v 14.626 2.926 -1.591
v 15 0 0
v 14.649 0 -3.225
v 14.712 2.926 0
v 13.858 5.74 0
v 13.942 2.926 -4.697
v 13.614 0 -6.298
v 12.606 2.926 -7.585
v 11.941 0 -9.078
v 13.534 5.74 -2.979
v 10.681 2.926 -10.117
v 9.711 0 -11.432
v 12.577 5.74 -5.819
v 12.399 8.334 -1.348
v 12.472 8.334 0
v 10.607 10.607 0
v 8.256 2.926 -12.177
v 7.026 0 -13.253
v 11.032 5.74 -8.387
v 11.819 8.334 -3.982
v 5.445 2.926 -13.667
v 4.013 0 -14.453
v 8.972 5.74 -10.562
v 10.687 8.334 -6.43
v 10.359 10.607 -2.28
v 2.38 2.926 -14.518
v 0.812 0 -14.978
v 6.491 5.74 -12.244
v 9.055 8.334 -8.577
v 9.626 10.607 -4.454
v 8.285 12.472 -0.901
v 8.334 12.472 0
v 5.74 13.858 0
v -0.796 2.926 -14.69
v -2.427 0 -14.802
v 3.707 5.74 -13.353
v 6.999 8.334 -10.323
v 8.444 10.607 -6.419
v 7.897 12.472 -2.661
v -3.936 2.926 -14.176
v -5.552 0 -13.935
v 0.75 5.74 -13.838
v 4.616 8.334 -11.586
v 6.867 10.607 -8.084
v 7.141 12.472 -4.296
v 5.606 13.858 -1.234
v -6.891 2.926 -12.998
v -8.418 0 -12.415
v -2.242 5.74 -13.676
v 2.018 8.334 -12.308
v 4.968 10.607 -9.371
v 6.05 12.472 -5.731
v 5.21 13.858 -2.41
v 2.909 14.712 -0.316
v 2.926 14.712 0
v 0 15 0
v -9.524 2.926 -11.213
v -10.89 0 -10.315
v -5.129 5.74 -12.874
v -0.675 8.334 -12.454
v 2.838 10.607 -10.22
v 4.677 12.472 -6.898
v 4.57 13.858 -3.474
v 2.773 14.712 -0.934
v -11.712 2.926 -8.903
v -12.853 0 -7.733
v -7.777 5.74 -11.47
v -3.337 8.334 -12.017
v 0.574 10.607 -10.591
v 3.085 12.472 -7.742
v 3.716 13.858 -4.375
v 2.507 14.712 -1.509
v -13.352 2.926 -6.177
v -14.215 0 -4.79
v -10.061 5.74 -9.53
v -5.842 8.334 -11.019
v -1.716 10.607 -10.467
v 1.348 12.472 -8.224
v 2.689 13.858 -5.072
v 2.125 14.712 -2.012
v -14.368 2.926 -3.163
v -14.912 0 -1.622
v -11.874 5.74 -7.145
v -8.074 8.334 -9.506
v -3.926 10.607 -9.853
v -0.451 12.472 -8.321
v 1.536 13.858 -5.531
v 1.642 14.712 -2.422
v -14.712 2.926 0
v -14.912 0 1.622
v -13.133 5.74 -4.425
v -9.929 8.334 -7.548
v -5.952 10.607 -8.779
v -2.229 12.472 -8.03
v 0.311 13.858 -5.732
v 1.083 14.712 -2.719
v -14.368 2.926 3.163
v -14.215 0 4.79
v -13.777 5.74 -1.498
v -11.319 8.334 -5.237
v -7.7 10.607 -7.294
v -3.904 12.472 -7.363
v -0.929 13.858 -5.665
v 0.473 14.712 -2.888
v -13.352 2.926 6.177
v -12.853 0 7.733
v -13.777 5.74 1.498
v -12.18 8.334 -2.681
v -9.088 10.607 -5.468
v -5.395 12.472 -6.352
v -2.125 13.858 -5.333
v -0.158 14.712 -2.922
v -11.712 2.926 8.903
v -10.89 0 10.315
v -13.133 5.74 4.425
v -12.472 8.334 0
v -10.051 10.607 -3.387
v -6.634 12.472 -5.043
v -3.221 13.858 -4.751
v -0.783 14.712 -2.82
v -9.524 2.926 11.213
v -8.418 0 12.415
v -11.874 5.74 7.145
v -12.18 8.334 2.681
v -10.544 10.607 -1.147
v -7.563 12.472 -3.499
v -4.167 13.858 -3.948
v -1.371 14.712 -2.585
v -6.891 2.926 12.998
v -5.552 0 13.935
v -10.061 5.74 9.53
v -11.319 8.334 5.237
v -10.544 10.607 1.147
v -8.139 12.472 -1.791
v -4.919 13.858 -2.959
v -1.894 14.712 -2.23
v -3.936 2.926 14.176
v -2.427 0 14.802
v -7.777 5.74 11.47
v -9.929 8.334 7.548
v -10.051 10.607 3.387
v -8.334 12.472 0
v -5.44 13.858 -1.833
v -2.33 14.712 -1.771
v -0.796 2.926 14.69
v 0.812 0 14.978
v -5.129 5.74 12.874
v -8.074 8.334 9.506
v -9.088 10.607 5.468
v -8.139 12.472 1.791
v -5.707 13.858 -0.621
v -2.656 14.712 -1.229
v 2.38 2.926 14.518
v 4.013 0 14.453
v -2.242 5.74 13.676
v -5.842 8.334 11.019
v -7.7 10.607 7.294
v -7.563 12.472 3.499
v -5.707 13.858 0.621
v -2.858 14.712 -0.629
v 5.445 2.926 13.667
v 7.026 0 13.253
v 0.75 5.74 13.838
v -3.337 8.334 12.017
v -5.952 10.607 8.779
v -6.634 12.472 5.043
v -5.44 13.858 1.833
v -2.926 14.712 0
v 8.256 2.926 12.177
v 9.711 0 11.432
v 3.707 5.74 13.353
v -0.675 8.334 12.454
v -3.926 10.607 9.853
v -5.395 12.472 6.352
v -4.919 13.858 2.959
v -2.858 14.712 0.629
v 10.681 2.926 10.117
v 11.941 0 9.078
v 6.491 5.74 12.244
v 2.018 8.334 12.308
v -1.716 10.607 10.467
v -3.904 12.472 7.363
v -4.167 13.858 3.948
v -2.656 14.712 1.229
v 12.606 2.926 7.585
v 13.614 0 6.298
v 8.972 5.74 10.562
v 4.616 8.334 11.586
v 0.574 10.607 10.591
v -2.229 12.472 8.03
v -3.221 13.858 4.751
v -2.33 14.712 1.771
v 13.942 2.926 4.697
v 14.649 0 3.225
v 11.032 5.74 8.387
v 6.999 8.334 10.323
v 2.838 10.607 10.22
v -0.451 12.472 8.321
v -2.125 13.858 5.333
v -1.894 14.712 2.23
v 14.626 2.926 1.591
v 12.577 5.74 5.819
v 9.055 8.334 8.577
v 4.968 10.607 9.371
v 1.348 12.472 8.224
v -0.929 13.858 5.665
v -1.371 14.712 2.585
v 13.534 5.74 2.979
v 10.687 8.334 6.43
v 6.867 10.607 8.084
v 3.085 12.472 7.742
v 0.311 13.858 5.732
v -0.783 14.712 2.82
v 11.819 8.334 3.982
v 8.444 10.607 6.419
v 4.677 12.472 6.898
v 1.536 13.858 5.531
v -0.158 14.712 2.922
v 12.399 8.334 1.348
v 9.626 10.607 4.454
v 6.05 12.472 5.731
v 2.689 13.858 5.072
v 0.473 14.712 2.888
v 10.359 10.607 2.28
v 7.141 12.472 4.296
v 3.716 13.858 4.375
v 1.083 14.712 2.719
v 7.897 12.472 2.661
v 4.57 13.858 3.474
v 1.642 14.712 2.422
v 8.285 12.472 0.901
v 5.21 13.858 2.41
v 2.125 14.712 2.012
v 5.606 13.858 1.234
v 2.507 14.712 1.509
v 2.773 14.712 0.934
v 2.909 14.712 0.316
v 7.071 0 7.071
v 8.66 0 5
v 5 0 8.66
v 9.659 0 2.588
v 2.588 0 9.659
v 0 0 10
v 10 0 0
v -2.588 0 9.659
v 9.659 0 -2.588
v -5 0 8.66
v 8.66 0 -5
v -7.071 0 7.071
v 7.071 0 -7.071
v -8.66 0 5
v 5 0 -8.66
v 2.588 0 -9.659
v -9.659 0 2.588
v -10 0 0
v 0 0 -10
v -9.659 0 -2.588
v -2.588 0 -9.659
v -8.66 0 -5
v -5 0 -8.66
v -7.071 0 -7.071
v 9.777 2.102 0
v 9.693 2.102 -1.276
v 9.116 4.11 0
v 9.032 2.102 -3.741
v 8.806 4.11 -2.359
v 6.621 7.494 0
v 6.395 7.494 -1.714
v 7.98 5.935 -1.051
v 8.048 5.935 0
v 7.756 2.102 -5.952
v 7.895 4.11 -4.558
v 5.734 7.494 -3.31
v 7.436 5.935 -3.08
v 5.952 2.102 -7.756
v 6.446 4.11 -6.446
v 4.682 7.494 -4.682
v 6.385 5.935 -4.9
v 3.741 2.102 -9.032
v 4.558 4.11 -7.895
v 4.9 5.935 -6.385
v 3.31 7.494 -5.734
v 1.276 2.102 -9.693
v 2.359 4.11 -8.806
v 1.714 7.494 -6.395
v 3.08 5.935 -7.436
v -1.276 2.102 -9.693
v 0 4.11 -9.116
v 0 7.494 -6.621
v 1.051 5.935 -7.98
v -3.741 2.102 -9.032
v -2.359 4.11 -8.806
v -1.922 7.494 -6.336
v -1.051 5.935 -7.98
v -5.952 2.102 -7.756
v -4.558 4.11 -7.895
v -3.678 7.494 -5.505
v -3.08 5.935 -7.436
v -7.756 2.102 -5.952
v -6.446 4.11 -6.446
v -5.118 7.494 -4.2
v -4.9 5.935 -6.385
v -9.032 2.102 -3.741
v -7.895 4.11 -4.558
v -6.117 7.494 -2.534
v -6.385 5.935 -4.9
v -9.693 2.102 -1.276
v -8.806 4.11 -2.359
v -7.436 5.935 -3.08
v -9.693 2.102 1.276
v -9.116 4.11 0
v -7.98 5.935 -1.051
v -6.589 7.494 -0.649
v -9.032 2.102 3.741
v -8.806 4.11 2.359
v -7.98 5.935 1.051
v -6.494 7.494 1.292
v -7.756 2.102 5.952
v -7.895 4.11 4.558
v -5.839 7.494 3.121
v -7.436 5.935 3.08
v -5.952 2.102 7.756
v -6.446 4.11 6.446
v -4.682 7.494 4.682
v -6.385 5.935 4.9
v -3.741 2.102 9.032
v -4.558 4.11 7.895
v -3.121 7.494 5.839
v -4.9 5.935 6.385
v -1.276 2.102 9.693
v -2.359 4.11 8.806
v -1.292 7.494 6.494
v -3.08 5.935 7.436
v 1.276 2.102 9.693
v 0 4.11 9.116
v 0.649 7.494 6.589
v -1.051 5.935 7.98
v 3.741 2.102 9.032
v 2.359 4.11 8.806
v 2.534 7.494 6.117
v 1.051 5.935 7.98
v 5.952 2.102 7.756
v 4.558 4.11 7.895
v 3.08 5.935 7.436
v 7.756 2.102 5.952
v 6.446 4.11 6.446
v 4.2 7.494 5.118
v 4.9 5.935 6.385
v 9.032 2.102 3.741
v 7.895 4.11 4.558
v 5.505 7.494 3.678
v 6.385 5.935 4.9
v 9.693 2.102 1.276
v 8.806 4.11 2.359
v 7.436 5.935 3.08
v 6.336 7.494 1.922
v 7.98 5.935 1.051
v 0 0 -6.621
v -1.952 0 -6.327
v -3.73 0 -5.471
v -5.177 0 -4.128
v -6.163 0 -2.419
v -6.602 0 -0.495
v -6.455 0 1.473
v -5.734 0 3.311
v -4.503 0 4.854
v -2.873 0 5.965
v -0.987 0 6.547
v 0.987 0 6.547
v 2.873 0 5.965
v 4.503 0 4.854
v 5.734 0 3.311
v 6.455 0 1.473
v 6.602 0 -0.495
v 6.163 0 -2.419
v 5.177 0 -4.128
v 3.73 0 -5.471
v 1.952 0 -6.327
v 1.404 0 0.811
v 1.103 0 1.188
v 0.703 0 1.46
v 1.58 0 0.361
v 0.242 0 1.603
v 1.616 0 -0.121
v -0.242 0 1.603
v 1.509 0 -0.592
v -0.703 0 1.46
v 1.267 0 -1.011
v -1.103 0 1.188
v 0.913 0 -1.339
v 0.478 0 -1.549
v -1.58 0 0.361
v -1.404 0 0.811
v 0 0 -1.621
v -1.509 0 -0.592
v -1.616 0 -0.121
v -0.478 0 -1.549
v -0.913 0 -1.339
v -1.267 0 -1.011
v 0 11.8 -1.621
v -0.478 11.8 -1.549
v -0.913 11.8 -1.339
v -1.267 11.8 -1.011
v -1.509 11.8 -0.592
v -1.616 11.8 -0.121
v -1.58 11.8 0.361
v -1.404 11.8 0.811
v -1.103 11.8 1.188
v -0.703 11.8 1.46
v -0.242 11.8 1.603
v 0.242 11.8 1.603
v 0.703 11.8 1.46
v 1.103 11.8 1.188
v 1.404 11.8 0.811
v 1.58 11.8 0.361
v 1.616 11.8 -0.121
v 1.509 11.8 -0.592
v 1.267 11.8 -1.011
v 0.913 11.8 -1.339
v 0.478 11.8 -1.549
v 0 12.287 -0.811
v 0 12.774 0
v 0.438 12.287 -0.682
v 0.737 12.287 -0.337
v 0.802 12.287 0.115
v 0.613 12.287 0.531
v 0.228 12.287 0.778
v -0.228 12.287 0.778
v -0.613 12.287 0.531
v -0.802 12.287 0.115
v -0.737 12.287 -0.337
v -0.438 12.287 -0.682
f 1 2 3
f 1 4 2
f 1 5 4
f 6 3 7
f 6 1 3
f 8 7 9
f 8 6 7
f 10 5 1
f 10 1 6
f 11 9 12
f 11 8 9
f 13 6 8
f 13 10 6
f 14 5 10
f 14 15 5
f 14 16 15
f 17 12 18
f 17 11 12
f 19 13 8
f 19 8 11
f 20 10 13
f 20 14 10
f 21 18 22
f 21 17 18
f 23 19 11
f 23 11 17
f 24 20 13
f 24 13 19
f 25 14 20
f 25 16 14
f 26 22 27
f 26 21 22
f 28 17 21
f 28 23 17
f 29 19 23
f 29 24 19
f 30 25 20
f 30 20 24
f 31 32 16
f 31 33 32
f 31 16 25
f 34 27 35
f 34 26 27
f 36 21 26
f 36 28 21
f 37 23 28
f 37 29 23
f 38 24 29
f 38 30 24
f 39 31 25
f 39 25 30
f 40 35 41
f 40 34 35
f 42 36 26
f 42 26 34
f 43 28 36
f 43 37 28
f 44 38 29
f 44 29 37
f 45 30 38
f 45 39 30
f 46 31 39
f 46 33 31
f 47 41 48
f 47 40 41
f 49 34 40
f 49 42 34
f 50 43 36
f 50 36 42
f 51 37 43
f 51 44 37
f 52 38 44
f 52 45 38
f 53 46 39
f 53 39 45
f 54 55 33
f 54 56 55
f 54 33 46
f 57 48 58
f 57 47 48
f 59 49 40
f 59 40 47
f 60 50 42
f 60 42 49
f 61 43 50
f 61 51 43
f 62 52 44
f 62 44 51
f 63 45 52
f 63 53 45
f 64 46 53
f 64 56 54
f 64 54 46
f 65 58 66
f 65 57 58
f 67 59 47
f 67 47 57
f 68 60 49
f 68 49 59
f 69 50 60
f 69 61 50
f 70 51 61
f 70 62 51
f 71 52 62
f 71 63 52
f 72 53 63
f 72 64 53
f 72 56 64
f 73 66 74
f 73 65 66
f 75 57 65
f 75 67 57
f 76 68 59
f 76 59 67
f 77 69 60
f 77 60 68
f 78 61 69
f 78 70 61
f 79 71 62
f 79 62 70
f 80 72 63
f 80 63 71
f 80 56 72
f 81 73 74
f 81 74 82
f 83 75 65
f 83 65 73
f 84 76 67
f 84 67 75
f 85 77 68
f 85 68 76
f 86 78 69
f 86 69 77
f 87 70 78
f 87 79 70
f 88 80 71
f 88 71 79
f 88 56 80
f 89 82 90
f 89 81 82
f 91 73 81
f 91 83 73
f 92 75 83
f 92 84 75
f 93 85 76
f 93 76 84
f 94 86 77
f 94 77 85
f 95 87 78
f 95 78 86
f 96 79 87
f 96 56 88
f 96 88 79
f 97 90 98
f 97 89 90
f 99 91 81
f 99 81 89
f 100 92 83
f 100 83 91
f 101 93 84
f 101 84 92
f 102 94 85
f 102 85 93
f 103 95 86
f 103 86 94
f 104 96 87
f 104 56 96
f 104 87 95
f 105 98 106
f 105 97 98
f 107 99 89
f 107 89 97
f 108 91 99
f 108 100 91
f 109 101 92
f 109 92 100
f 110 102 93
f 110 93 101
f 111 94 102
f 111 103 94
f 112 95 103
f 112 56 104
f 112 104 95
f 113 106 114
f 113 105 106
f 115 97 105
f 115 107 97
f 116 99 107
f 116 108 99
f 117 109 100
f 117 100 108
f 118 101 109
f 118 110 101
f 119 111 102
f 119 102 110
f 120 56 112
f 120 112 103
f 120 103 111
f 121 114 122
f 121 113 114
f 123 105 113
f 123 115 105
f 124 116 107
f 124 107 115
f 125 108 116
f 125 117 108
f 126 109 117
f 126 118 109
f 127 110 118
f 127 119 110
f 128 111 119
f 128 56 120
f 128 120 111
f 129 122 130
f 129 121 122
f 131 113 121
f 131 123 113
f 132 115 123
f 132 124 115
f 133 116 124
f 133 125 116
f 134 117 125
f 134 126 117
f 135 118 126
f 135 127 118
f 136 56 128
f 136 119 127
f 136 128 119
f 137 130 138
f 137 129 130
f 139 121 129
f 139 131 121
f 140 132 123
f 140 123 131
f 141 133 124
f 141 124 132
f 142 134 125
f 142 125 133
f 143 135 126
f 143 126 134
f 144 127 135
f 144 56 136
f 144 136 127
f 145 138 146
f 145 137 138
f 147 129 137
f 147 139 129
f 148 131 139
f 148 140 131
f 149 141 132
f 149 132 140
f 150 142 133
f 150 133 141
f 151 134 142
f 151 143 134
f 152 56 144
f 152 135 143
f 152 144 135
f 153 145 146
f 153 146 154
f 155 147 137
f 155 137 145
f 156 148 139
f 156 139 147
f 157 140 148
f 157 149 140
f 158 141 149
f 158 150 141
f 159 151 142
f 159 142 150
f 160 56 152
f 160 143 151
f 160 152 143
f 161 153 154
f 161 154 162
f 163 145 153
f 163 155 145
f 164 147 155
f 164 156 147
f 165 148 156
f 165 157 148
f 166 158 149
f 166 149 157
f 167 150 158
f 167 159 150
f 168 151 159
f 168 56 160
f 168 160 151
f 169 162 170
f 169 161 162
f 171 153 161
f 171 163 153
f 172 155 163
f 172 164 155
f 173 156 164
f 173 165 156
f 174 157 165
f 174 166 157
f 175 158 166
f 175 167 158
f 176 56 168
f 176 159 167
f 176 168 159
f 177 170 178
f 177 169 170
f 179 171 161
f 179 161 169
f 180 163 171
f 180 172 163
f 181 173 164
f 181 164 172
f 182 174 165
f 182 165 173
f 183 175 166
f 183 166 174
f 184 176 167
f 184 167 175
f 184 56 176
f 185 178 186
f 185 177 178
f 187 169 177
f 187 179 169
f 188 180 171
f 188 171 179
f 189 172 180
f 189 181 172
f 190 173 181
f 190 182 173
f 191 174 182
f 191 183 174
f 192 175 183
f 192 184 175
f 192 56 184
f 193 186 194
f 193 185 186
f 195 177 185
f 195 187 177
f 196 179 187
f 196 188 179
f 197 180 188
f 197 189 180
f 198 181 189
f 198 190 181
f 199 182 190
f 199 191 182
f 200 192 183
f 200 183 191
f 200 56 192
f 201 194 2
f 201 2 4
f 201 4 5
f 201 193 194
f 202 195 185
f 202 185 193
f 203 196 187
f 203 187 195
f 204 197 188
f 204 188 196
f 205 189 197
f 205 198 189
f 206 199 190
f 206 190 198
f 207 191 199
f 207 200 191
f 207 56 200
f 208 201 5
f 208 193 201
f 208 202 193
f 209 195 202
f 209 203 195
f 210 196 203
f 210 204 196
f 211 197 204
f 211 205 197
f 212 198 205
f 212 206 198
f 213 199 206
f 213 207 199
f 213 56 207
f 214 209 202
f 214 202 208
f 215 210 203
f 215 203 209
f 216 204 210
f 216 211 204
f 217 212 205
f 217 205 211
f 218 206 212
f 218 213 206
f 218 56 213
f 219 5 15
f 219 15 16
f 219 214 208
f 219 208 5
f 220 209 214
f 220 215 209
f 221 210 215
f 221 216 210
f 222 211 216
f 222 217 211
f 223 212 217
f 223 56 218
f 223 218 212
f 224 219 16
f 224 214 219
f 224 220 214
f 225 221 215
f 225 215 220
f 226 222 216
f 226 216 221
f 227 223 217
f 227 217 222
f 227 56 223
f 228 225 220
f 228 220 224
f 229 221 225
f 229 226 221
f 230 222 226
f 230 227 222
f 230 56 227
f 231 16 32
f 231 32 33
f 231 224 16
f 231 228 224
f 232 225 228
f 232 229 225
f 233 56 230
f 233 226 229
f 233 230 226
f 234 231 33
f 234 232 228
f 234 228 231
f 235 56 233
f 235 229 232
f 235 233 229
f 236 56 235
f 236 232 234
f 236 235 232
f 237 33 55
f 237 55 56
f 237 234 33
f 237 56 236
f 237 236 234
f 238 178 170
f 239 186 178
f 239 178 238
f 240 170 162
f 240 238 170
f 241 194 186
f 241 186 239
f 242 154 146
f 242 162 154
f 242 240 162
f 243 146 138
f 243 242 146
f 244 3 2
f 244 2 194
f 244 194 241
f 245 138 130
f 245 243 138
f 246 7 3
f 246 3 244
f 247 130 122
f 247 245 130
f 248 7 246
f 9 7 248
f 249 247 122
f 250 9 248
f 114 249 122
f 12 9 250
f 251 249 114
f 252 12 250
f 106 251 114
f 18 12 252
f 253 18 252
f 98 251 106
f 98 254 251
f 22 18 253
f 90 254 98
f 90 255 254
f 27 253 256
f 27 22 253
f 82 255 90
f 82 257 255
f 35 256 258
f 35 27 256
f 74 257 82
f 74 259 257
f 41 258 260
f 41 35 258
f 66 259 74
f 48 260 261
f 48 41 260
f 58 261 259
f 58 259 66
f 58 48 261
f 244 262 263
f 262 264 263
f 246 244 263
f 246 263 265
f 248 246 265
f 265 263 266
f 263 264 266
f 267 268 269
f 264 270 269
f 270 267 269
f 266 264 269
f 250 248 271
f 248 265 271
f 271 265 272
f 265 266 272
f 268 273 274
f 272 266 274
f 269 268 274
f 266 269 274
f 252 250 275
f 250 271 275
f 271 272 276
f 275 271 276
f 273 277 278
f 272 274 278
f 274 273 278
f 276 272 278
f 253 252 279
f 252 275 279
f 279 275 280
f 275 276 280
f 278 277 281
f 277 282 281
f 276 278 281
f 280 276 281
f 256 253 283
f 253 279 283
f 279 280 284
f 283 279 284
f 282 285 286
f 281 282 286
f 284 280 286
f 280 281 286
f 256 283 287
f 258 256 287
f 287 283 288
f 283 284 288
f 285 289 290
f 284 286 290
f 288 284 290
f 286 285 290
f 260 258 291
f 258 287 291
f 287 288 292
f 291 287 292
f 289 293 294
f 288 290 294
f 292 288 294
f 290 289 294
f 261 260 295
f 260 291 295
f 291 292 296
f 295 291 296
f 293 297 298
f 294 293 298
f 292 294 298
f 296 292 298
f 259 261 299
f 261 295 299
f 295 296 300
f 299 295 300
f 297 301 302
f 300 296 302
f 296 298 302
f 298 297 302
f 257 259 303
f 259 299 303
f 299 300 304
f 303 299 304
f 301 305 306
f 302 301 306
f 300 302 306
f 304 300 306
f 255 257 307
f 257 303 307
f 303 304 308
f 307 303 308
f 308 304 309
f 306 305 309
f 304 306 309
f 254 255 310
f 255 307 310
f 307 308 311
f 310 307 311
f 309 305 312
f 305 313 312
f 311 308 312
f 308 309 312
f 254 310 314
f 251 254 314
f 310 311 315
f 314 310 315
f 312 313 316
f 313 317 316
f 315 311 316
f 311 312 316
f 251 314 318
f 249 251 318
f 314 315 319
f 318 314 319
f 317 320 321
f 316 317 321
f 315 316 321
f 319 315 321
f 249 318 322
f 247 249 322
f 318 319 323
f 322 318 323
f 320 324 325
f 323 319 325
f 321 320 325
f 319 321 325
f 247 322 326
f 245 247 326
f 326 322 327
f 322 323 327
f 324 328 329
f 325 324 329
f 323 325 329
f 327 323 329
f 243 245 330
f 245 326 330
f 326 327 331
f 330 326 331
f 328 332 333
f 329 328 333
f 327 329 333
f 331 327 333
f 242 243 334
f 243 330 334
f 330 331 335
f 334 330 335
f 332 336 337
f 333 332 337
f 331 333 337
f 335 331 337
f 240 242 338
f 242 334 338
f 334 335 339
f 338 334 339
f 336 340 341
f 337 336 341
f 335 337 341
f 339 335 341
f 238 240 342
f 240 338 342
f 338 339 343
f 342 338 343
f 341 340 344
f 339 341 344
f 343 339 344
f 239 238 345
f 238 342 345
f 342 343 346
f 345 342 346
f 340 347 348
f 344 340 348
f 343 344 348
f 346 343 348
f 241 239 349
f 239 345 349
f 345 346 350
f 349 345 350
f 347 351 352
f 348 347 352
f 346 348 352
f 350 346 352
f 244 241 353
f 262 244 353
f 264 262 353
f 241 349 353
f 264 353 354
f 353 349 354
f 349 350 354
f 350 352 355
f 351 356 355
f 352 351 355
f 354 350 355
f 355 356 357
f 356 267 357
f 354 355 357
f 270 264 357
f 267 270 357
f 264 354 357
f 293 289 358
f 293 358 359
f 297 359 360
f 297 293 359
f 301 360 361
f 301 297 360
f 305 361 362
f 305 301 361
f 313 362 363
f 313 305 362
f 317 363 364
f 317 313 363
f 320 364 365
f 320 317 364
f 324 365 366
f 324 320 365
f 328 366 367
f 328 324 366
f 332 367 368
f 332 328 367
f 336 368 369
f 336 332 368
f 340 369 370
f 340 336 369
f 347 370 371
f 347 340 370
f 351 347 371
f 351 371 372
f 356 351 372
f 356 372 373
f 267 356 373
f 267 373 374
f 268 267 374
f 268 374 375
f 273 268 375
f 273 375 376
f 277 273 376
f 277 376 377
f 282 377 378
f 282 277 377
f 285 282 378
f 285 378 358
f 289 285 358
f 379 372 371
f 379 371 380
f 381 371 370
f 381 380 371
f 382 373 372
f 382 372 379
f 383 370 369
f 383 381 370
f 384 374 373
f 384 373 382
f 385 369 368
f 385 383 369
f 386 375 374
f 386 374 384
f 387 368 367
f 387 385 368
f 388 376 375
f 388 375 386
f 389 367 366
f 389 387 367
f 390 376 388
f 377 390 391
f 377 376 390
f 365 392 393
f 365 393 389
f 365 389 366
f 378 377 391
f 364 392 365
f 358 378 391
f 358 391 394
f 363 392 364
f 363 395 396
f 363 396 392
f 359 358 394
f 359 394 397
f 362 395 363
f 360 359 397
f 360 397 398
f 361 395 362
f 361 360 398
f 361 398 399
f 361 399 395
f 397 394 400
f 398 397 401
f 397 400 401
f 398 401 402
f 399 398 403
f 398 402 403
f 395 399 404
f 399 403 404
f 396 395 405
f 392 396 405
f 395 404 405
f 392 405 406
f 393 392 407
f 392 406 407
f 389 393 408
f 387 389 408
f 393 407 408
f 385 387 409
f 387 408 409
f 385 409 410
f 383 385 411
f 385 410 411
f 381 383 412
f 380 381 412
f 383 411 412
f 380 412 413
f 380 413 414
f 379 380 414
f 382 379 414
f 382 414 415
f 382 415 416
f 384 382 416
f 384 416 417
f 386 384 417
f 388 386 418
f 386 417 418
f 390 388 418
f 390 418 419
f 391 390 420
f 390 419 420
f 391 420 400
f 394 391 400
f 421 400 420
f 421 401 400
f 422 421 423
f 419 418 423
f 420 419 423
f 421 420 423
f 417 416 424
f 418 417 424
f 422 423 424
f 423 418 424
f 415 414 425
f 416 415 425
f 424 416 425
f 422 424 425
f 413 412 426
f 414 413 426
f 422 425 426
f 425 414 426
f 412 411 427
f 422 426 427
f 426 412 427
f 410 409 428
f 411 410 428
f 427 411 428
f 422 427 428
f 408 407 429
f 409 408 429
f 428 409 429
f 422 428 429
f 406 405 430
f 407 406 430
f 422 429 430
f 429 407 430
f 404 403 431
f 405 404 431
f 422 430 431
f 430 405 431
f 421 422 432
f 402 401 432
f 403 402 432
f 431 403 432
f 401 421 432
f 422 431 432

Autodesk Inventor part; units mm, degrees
ref_plane "YZ Plane" through (0, 0, 0) normal (1, 0, 0) x (0, 1, 0)
ref_plane "XZ Plane" through (0, 0, 0) normal (0, 1, 0) x (-1, 0, 0)
ref_plane "XY Plane" through (0, 0, 0) normal (0, 0, 1) x (1, 0, 0)
sketch "Sketch1" plane through (0, 0, 0) normal (0, 0, 1) x (1, 0, 0)
  line L0 (0, 0) -> (0, 15)
  line L1 (0, 0) -> (15, 0)
  arc A0 (15, 0) -> (0, 15) centre (0, 0) ccw
  line L2 (0, -3.6213) -> (0, 21.7279) projected
  dimension "d2" = 15
revolve "Revolution1" add sketch "Sketch1" angle 360 about axis through (0, -10, 0) along (0, 1, 0)
sketch "Sketch4" plane through (0, 0, 0) normal (0, -1, 0) x (1, 0, 0)
  point P0 (0, 0)
  point P1 (0, 0)
hole "Hole2" at (0, 0, 0) direction (0, 1, 0) diameter 3.242 depth 11.8 tip angle 118 thread size "M4x0.7" class "6H" standard "ANSI Metric M Profile"
shell "Shell2" thickness 5 removed faces 1 at (10.3911, 0, 1.2617)
properties part number "Ball_Upper Half" material "Nylon 6/6"
